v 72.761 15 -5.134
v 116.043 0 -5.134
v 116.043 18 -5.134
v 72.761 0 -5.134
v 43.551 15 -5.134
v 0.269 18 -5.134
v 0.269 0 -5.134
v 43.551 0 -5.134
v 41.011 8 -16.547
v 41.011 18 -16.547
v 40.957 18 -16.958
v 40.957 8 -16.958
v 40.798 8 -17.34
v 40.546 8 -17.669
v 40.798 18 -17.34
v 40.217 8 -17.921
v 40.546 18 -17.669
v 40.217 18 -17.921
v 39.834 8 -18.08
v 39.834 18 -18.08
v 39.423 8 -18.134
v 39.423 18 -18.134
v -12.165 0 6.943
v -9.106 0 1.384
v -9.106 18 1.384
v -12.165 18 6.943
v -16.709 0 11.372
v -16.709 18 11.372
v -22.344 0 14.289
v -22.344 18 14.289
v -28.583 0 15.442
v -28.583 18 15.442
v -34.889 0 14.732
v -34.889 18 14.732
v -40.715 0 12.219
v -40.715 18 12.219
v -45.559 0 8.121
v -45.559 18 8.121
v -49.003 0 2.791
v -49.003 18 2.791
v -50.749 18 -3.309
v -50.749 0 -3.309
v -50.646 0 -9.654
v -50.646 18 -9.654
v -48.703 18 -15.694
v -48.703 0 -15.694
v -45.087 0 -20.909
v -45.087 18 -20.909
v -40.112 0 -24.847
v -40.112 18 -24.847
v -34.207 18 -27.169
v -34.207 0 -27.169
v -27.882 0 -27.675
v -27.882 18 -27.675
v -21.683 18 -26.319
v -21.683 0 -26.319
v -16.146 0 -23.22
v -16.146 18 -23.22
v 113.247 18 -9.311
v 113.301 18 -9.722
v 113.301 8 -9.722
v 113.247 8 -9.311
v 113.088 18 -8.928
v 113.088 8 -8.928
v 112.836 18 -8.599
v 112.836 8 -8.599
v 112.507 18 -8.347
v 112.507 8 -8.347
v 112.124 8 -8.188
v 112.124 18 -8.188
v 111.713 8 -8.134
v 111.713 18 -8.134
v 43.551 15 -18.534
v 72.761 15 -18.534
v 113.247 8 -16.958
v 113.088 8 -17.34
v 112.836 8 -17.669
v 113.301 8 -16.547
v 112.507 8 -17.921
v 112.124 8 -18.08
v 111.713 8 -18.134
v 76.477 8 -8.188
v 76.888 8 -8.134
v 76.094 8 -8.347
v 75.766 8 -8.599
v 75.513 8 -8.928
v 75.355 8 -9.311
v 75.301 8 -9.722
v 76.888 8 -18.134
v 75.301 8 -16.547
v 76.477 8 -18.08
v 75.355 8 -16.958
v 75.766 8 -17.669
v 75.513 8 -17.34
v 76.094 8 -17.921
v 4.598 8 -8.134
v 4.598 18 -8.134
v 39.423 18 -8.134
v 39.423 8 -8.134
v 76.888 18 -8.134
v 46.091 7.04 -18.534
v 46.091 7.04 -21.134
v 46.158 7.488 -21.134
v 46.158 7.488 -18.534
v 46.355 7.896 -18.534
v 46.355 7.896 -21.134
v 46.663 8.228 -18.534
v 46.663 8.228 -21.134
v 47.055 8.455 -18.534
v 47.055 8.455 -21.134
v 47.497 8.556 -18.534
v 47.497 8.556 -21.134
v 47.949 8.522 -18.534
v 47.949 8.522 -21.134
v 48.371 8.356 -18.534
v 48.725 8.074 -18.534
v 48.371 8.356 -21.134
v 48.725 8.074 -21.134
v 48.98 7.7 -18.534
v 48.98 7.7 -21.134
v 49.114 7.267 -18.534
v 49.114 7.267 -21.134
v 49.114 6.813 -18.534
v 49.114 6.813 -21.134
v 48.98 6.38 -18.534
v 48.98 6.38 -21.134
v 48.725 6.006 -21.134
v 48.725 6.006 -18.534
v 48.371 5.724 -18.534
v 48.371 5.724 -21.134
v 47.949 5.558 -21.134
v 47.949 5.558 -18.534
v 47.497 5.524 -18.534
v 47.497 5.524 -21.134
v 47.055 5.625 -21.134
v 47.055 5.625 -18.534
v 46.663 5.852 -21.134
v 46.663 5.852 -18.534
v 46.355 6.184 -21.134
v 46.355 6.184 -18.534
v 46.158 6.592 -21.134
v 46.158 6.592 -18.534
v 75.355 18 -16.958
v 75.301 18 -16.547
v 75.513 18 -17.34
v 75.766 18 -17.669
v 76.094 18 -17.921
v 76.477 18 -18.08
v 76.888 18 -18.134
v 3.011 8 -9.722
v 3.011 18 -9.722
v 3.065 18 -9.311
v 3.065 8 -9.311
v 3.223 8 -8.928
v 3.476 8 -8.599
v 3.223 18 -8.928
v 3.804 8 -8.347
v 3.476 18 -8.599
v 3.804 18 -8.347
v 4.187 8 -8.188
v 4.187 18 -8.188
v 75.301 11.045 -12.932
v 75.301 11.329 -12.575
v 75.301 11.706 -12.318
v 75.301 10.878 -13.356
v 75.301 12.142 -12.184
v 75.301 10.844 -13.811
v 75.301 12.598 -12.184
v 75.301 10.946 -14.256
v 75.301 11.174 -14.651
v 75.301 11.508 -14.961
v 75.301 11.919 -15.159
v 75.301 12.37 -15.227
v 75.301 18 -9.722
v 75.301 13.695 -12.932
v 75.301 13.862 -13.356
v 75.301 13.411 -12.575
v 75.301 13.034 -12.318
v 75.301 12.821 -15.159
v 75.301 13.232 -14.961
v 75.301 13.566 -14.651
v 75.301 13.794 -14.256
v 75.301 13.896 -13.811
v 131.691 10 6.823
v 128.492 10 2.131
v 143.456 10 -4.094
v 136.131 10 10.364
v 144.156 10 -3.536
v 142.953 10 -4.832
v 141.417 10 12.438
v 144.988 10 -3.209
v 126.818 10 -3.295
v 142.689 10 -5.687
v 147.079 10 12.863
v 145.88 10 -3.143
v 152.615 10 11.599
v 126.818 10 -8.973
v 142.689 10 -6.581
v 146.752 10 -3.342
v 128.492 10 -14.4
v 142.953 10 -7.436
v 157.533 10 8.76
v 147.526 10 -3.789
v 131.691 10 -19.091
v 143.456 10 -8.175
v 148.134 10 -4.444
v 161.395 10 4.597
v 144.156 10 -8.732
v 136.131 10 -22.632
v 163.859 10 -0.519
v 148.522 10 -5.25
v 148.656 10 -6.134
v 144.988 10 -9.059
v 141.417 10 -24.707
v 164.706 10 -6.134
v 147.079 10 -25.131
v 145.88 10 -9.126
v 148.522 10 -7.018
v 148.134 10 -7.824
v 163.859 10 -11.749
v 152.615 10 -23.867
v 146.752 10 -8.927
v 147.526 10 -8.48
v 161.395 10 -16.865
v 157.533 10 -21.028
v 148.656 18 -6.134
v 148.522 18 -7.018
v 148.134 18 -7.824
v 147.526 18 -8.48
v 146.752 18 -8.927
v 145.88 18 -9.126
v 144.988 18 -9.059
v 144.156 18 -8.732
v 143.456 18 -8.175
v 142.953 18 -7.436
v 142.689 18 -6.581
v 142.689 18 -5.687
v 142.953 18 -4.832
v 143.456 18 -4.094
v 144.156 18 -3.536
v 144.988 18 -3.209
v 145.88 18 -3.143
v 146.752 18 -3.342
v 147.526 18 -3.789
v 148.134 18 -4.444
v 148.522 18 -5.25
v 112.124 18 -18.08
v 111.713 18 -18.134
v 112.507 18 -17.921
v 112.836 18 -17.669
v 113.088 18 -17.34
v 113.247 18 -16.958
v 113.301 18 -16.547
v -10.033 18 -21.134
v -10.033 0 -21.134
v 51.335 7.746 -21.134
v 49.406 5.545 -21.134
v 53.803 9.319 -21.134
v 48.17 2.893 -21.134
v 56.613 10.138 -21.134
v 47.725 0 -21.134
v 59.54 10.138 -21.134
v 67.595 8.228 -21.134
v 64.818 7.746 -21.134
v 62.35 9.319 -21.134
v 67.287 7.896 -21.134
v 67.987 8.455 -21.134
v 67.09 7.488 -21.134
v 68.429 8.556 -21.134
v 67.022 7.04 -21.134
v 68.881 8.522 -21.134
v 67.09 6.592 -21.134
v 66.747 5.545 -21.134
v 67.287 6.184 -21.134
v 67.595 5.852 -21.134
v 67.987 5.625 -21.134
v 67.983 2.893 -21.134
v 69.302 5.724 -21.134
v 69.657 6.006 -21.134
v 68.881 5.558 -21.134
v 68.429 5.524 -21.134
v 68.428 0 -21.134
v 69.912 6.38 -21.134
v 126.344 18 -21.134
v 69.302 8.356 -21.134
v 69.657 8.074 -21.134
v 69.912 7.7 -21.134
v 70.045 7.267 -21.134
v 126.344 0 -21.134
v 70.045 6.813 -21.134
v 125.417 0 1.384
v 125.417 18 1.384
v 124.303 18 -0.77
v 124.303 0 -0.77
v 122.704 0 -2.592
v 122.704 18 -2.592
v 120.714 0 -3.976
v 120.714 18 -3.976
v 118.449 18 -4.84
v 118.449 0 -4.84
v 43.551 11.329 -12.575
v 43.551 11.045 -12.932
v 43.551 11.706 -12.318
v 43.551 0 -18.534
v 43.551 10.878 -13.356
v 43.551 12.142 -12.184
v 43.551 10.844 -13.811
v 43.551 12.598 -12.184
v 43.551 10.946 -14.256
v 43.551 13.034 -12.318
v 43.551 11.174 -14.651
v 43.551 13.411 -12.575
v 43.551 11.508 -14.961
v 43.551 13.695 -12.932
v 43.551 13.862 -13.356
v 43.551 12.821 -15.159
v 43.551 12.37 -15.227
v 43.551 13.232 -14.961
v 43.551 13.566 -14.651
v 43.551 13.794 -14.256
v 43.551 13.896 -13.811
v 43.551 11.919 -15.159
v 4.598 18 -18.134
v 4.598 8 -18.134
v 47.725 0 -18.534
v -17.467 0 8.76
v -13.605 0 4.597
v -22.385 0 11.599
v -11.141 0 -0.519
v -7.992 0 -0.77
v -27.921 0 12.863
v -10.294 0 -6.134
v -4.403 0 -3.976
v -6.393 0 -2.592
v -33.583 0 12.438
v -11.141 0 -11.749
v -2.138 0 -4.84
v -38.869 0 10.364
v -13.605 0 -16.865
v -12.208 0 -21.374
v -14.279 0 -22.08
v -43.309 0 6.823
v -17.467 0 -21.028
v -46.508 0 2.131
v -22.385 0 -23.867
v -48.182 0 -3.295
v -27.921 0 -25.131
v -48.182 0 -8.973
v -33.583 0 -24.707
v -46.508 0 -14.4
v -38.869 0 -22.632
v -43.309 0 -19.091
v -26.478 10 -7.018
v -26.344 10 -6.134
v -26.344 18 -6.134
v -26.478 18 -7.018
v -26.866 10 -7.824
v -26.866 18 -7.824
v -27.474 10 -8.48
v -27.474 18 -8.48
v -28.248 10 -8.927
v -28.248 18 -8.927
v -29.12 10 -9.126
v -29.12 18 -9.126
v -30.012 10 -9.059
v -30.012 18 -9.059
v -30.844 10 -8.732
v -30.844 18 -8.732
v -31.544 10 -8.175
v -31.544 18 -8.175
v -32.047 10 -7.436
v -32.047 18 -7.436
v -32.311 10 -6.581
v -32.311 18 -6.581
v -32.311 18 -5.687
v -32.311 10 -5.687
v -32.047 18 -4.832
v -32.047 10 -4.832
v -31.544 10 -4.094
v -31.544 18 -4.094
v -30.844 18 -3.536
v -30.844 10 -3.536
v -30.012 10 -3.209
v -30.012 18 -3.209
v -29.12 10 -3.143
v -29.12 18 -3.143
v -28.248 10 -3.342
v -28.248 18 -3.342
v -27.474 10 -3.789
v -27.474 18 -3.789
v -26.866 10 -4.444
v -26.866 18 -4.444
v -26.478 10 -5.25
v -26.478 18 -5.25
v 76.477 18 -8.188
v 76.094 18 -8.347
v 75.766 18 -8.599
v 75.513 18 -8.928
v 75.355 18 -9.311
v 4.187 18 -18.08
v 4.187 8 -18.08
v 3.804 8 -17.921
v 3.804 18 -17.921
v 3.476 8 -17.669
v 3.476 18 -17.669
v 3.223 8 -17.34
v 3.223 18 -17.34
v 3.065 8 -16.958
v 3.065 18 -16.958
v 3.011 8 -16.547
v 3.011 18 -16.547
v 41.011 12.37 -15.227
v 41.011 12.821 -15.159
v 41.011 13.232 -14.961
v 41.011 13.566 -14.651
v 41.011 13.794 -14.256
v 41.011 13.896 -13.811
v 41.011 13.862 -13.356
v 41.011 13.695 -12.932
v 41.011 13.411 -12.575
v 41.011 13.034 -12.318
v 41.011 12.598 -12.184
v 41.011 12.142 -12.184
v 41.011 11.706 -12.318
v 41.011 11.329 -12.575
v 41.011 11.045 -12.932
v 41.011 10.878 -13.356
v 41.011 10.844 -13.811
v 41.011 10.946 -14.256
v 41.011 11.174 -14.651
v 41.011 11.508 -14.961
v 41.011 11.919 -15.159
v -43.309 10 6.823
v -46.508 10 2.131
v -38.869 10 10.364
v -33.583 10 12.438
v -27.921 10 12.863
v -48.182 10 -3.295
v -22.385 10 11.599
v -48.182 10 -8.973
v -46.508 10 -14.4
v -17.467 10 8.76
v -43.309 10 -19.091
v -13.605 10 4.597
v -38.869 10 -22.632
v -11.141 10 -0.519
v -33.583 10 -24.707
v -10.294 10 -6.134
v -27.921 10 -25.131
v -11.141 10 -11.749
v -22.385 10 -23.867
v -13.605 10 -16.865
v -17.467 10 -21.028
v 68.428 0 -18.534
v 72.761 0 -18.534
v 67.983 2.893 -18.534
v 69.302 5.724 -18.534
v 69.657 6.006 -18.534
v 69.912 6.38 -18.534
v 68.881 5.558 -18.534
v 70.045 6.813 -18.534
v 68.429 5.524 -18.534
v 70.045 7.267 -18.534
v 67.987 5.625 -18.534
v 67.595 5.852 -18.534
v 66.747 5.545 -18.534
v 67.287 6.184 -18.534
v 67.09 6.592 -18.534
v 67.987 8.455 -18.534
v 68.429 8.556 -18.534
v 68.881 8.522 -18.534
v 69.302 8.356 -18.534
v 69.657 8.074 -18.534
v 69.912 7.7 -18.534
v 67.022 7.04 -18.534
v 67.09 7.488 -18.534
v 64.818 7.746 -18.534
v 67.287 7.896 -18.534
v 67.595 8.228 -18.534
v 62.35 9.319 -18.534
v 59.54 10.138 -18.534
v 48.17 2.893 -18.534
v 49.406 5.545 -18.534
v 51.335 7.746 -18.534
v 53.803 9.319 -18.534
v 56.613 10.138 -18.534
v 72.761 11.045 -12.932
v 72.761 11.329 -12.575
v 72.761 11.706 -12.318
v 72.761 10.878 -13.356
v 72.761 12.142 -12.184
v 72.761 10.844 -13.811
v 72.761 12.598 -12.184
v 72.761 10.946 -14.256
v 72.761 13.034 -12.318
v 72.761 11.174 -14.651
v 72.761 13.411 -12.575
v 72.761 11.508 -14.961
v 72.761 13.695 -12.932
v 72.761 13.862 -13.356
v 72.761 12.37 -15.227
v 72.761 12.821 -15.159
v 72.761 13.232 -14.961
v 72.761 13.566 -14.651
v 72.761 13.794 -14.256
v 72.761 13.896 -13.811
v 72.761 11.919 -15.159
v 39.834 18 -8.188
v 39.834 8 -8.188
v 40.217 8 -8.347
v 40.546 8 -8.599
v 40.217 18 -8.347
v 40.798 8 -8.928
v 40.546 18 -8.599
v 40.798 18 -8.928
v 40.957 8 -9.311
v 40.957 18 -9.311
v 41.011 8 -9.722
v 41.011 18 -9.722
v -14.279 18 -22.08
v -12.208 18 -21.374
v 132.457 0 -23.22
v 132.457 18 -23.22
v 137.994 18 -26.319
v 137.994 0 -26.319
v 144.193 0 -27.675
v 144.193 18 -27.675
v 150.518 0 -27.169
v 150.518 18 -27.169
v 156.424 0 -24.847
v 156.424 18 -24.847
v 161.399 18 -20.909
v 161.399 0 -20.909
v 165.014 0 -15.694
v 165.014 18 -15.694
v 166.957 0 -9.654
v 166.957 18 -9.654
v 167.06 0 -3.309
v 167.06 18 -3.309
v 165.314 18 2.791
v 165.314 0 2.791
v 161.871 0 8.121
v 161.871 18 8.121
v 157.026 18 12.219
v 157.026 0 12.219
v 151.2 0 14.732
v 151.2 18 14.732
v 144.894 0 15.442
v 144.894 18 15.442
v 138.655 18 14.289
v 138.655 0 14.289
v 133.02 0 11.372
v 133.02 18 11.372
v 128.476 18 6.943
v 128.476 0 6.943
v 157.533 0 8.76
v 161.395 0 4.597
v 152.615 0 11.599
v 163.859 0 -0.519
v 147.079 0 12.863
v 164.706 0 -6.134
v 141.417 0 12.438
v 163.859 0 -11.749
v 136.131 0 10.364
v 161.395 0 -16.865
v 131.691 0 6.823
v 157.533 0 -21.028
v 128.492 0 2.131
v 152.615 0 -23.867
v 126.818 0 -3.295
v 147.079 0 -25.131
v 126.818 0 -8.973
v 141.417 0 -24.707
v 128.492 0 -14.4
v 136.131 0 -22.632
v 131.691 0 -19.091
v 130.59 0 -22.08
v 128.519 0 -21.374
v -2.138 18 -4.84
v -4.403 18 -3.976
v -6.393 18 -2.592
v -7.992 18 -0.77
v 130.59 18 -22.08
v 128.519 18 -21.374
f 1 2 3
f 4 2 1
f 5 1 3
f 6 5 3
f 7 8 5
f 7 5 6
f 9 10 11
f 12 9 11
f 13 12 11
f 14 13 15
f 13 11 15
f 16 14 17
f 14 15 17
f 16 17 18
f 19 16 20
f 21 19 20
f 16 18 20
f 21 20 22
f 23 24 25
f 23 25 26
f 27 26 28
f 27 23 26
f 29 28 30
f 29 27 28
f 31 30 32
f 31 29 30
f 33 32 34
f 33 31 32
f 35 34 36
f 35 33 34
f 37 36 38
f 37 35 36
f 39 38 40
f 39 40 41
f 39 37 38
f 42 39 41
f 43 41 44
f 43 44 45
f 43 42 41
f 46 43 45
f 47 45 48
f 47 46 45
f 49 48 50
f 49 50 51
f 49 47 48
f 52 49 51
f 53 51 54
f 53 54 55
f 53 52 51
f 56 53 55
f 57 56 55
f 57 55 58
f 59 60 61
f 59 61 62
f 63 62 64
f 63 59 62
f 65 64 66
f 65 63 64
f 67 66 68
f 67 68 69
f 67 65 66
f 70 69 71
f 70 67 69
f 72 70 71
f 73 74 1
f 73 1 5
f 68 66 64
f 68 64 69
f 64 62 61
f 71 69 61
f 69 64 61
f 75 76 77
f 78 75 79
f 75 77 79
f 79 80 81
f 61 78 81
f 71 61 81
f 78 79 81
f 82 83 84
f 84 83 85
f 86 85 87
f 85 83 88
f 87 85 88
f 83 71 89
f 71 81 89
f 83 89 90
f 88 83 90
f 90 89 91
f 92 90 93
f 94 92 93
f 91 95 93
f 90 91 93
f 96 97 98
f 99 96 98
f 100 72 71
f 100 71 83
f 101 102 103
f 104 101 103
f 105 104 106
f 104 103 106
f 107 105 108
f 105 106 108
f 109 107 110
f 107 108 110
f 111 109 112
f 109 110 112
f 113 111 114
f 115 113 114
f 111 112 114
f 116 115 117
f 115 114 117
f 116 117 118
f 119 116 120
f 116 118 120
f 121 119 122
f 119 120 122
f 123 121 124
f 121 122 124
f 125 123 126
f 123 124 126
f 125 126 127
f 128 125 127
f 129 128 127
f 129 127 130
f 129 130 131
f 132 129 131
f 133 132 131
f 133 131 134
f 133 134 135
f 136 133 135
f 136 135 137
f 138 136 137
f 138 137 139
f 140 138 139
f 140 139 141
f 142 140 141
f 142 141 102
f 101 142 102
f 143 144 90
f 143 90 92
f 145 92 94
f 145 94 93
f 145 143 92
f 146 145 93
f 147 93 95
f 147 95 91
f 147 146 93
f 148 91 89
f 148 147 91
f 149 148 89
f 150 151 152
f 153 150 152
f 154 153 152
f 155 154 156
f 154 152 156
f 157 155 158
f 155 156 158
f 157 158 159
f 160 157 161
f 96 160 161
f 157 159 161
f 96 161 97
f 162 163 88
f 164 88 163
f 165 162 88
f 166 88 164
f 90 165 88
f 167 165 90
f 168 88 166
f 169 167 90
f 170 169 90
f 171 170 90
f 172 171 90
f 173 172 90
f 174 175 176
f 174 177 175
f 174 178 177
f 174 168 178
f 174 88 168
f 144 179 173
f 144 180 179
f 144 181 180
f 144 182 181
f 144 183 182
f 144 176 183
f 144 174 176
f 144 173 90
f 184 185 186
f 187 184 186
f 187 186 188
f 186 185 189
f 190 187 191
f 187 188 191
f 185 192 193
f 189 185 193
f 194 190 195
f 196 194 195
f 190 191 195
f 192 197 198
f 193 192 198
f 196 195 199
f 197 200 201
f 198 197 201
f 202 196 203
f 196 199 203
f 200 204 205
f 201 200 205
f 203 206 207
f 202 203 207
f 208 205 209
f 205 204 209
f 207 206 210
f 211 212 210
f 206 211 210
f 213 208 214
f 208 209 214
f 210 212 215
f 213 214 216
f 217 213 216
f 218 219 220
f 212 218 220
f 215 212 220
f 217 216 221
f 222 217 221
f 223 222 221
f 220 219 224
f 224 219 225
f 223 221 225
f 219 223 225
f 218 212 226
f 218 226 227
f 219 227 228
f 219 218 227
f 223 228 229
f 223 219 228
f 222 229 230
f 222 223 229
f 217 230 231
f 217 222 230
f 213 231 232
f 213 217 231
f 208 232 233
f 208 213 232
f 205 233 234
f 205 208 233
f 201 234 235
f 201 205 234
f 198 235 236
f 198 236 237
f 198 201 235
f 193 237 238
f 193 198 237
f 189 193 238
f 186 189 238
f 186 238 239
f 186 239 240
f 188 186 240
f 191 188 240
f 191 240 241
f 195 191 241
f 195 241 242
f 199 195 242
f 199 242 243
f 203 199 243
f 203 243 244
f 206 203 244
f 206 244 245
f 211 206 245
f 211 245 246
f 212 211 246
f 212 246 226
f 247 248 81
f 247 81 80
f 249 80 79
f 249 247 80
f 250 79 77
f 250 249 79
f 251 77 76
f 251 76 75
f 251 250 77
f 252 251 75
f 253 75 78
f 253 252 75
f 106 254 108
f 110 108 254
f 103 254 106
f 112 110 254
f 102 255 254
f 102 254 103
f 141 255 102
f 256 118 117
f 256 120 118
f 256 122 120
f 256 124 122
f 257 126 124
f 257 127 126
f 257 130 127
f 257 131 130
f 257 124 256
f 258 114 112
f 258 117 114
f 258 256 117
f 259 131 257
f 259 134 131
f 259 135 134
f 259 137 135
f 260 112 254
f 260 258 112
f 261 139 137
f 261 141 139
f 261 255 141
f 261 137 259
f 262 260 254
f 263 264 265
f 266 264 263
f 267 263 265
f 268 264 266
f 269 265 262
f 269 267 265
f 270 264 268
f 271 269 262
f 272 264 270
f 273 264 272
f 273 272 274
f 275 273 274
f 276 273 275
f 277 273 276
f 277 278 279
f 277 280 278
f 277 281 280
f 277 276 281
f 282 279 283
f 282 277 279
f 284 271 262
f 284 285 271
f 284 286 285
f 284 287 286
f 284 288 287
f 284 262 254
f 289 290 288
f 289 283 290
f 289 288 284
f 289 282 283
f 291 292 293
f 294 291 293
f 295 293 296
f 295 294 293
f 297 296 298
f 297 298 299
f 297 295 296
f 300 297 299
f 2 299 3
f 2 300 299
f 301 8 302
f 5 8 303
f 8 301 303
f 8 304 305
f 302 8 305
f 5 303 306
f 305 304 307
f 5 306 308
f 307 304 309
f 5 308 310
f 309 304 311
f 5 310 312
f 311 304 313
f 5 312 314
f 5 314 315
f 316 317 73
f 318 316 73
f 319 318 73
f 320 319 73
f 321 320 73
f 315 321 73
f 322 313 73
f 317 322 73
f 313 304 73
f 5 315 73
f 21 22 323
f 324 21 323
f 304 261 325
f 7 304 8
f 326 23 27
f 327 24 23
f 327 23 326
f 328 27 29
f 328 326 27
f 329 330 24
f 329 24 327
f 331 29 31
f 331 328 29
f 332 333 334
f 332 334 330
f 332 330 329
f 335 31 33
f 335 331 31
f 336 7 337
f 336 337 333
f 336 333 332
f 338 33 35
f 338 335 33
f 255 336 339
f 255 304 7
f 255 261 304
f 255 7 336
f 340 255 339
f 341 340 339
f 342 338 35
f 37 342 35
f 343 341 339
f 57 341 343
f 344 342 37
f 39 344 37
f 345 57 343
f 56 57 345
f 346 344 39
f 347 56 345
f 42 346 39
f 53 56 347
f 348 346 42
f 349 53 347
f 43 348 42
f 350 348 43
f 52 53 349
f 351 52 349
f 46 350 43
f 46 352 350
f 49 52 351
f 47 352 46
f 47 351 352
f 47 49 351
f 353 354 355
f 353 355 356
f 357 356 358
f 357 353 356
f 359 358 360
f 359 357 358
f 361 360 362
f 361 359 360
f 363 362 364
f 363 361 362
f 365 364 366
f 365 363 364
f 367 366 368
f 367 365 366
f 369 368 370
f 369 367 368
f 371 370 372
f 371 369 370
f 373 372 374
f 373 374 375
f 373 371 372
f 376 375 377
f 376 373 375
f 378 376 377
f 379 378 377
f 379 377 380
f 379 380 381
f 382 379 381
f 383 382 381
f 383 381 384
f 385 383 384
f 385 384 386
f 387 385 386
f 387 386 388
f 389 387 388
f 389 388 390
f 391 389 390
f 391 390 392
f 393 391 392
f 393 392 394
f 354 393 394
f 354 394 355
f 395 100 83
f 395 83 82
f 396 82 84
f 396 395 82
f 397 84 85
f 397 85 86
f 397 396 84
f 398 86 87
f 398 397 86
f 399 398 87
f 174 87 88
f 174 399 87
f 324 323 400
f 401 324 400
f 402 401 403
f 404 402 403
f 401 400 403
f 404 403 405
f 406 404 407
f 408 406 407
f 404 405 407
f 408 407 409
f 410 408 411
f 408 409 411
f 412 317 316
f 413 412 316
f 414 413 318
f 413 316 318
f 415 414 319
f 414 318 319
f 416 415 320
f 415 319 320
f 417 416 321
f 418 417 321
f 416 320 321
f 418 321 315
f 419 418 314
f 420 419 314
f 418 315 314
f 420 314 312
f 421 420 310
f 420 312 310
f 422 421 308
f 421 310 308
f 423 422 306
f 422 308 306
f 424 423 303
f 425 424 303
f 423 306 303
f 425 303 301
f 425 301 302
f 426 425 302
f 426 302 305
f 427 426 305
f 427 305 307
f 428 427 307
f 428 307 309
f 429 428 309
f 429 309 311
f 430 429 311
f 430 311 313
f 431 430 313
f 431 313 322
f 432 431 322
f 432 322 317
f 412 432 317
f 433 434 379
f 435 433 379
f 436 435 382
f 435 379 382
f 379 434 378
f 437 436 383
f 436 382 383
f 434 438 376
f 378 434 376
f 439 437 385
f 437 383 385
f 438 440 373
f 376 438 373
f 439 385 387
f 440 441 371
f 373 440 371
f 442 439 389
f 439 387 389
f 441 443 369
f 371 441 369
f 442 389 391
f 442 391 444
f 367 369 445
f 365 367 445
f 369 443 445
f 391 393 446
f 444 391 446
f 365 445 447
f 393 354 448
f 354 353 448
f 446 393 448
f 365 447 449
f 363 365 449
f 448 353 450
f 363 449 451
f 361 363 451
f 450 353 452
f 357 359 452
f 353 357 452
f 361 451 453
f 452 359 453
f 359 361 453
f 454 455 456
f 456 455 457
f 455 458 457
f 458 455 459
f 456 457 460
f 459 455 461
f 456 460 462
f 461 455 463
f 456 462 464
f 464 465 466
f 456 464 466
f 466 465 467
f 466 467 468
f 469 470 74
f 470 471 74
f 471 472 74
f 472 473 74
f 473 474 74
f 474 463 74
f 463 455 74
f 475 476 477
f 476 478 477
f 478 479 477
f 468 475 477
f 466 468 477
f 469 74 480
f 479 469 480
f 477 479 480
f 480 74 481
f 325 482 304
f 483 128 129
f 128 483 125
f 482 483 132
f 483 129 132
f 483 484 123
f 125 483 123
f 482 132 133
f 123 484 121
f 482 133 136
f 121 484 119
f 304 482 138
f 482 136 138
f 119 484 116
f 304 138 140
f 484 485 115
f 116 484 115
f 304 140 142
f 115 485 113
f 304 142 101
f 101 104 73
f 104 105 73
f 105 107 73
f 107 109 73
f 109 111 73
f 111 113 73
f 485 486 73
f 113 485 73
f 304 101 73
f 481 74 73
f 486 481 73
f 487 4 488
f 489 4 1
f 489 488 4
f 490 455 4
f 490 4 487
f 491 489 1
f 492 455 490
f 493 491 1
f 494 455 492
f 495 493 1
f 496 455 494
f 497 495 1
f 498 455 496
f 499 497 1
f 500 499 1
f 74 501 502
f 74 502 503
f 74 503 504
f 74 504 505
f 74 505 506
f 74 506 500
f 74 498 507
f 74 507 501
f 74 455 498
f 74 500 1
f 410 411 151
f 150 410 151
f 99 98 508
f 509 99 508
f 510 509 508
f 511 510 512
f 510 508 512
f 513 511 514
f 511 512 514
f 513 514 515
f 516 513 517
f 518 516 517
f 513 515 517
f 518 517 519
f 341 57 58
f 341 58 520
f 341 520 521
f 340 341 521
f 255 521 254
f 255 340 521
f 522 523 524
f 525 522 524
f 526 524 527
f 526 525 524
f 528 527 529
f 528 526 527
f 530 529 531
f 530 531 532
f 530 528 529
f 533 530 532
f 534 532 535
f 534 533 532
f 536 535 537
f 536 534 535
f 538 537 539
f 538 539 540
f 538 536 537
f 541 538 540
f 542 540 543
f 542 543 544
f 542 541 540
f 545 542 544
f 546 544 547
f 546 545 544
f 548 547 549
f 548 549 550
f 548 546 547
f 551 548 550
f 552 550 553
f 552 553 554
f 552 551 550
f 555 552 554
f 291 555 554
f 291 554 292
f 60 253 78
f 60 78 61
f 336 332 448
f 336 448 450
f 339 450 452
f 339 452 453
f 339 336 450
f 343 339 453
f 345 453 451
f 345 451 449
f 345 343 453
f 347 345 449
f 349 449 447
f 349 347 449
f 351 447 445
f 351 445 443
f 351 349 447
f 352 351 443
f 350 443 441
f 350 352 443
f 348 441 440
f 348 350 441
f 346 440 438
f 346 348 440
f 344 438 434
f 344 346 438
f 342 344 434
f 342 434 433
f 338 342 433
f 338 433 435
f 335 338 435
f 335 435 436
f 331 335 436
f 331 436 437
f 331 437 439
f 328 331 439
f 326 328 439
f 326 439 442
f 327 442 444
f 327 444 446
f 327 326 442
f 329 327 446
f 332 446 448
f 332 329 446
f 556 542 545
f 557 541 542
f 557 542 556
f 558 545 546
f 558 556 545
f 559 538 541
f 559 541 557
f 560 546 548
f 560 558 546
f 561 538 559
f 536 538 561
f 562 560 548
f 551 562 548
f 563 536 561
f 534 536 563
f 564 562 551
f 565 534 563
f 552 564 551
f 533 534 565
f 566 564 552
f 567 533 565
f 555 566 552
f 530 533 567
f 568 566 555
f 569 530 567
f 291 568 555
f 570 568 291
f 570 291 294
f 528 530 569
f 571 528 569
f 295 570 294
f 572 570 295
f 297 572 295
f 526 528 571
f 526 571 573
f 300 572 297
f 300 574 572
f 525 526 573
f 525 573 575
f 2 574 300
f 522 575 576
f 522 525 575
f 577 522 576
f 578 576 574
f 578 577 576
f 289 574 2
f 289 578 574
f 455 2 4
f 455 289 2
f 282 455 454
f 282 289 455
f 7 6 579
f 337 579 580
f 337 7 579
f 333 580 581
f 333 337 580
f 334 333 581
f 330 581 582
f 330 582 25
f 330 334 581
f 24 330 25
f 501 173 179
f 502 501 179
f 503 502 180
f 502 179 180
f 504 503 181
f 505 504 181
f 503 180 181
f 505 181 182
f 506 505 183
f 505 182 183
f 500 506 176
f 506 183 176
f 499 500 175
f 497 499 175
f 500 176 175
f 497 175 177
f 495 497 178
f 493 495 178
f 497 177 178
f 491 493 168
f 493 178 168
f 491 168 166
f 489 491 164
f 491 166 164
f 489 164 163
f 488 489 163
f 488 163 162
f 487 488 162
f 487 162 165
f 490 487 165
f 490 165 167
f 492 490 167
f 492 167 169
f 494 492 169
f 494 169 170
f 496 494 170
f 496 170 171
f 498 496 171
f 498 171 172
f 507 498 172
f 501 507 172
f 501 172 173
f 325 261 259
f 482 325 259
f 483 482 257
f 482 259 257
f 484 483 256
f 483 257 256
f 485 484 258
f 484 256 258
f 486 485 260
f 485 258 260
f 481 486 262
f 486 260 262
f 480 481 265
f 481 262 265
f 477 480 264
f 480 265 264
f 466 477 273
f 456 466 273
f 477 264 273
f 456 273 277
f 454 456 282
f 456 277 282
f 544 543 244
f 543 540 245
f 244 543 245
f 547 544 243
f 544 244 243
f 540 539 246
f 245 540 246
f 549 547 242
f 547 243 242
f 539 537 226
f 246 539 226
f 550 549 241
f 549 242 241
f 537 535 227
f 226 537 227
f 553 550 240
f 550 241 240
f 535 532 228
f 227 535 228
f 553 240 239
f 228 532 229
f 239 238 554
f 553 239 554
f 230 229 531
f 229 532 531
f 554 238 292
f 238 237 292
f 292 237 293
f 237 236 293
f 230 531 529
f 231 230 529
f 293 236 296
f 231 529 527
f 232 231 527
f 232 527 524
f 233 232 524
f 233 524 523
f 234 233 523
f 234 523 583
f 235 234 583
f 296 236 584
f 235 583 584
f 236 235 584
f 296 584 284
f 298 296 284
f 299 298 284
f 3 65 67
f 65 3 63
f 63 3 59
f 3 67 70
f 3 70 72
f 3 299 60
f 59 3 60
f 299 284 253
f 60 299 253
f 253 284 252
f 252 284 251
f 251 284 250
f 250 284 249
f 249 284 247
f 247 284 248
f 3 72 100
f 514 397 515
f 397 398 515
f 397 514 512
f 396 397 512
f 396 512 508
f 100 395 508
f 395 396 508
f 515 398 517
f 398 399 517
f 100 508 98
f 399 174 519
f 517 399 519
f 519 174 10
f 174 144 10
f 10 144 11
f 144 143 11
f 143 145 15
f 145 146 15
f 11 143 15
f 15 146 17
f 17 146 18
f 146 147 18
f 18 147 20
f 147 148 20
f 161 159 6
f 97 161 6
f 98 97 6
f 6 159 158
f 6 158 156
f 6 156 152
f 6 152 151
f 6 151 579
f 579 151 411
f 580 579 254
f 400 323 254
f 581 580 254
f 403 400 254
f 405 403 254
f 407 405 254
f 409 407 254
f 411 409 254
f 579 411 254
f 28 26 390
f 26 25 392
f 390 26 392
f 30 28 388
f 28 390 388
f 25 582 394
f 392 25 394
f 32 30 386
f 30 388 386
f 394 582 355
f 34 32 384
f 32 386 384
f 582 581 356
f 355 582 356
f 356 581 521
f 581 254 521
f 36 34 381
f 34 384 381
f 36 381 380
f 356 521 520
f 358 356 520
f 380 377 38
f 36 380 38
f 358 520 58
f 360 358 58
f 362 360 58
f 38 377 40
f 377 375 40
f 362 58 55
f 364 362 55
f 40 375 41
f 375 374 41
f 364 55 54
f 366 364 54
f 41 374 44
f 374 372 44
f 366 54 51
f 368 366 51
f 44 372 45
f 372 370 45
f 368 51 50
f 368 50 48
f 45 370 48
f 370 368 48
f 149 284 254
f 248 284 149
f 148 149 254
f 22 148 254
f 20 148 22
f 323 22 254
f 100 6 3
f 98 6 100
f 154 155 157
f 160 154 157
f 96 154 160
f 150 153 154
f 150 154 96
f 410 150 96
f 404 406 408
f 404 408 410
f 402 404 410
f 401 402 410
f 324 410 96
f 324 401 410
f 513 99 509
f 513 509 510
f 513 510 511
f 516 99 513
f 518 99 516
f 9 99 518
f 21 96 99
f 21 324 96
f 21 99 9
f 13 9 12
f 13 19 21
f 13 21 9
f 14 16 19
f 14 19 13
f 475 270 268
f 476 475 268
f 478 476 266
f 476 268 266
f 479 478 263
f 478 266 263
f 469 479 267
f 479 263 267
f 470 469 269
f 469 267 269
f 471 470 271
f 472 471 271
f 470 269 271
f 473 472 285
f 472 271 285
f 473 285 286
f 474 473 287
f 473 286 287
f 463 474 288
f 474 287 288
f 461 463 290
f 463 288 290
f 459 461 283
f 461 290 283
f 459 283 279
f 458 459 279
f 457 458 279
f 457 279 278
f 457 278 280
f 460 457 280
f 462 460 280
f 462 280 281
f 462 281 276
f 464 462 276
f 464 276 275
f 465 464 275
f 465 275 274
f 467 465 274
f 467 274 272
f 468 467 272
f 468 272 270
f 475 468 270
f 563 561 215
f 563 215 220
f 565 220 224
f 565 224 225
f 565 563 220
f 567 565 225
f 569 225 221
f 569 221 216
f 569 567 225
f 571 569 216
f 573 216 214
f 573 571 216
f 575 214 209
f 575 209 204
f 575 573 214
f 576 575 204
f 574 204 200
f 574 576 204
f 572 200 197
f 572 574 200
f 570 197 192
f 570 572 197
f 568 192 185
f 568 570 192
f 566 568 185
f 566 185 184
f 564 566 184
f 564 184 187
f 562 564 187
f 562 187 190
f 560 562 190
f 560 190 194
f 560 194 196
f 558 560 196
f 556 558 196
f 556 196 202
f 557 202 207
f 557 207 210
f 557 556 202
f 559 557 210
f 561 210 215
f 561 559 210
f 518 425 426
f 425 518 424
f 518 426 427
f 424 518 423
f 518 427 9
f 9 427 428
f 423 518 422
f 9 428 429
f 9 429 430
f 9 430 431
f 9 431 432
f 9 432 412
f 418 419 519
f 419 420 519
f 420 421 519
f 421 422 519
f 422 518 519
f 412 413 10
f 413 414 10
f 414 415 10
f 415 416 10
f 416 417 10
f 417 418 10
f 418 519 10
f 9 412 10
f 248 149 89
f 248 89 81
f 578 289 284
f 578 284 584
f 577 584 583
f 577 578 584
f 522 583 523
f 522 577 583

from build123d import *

# Parameters (mm, degrees)
SKETCH1_R      = 3
EXTRUDE1_DEPTH = 18
SKETCH1_3_R    = 19.05
EXTRUDE2_DEPTH = 10
SKETCH2_R      = 1.52
EXTRUDE3_DEPTH = 37.59
EXTRUDE4_START = -2.6
SKETCH3_W      = 29.21
SKETCH3_H      = 15
EXTRUDE4_DEPTH = 34.99
EXTRUDE6_DEPTH = 10
SKETCH8_R      = 1.53
EXTRUDE7_DEPTH = 43
EXTRUDE8_DEPTH = 37.59


with BuildPart() as part:
    # Sketch1 → Extrude1 (new body)
    with BuildSketch(Plane(origin=(0, 0, 0), x_dir=(1, 0, 0), z_dir=(0, 1, 0))):
        with BuildLine():
            Line((-10.033035154, 21.134136258), (126.344272034, 21.134136258))
            ThreePointArc((126.344272034, 21.134136258), (129.573902971, 21.670020662), (132.457392138, 23.220239455))
            ThreePointArc((132.457392138, 23.220239455), (166.412495407, 0.194425945), (125.416806741, -1.383749149))
            ThreePointArc((125.416806741, -1.383749149), (121.751361628, 3.344530461), (116.04264662, 5.134136258))
            Line((116.04264662, 5.134136258), (0.26859026, 5.134136258))
            ThreePointArc((0.26859026, 5.134136258), (-5.440124747, 3.344530461), (-9.10556986, -1.383749149))
            ThreePointArc((-9.10556986, -1.383749149), (-50.101258526, 0.194425945), (-16.146155257, 23.220239455))
            ThreePointArc((-16.146155257, 23.220239455), (-13.262666091, 21.670020662), (-10.033035154, 21.134136258))
        make_face()
        with Locations((-29.34438156, 6.134136258)):
            Circle(SKETCH1_R, mode=Mode.SUBTRACT)
        with Locations((145.65561844, 6.134136258)):
            Circle(SKETCH1_R, mode=Mode.SUBTRACT)
    extrude(amount=EXTRUDE1_DEPTH)

    # Sketch1<3> → Extrude2 (cut)
    with BuildSketch(Plane(origin=(0, 0, 0), x_dir=(1, 0, 0), z_dir=(0, 1, 0))):
        with Locations((-29.34438156, 6.134136258)):
            Circle(SKETCH1_3_R)
        with Locations((145.65561844, 6.134136258)):
            Circle(SKETCH1_3_R)
    extrude(amount=EXTRUDE2_DEPTH, mode=Mode.SUBTRACT)

    # Sketch2 → Extrude3 (cut, through all)
    with BuildSketch(Plane(origin=(0, 0, -21.134136258), x_dir=(-1, 0, 0), z_dir=(0, 0, -1))):
        with Locations((-68.542401875, 7.04)):
            Circle(SKETCH2_R)
        with Locations((-47.61061844, 7.04)):
            Circle(SKETCH2_R)
    extrude(amount=-EXTRUDE3_DEPTH, mode=Mode.SUBTRACT)

    # Sketch3 → Extrude4 (cut, through all)
    with BuildSketch(Plane(origin=(0, 0, -21.134136258), x_dir=(-1, 0, 0), z_dir=(0, 0, -1)).offset(EXTRUDE4_START)):
        with Locations((-58.15561844, 7.5)):
            Rectangle(SKETCH3_W, SKETCH3_H)
    extrude(amount=-EXTRUDE4_DEPTH, mode=Mode.SUBTRACT)

    # Sketch6 → Extrude6 (cut)
    with BuildSketch(Plane(origin=(0, 18, 0), x_dir=(1, 0, 0), z_dir=(0, 1, 0))):
        with BuildLine():
            Line((41.01061844, 13.134136258), (41.01061844, 16.546636258))
            ThreePointArc((41.01061844, 16.546636258), (40.545650455, 17.669168273), (39.42311844, 18.134136258))
            Line((39.42311844, 18.134136258), (4.59811844, 18.134136258))
            ThreePointArc((4.59811844, 18.134136258), (3.475586425, 17.669168273), (3.01061844, 16.546636258))
            Line((3.01061844, 16.546636258), (3.01061844, 9.721636258))
            ThreePointArc((3.01061844, 9.721636258), (3.475586425, 8.599104243), (4.59811844, 8.134136258))
            Line((4.59811844, 8.134136258), (39.42311844, 8.134136258))
            ThreePointArc((39.42311844, 8.134136258), (40.545650455, 8.599104243), (41.01061844, 9.721636258))
            Line((41.01061844, 9.721636258), (41.01061844, 13.134136258))
        make_face()
        with BuildLine():
            Line((75.30061844, 9.721636258), (75.30061844, 13.134136258))
            Line((75.30061844, 13.134136258), (75.30061844, 16.546636258))
            ThreePointArc((75.30061844, 16.546636258), (75.765586425, 17.669168273), (76.88811844, 18.134136258))
            Line((76.88811844, 18.134136258), (111.71311844, 18.134136258))
            ThreePointArc((111.71311844, 18.134136258), (112.835650455, 17.669168273), (113.30061844, 16.546636258))
            Line((113.30061844, 16.546636258), (113.30061844, 9.721636258))
            ThreePointArc((113.30061844, 9.721636258), (112.835650455, 8.599104243), (111.71311844, 8.134136258))
            Line((111.71311844, 8.134136258), (76.88811844, 8.134136258))
            ThreePointArc((76.88811844, 8.134136258), (75.765586425, 8.599104243), (75.30061844, 9.721636258))
        make_face()
    extrude(amount=-EXTRUDE6_DEPTH, mode=Mode.SUBTRACT)

    # Sketch8 → Extrude7 (cut)
    with BuildSketch(Plane(origin=(75.30061844, 0, 0), x_dir=(0, 0, -1), z_dir=(1, 0, 0))):
        with Locations((13.696636258, 12.37)):
            Circle(SKETCH8_R)
    extrude(amount=-EXTRUDE7_DEPTH, mode=Mode.SUBTRACT)

    # Sketch9 → Extrude8 (cut, through all)
    with BuildSketch(Plane(origin=(0, 0, -21.134136258), x_dir=(-1, 0, 0), z_dir=(0, 0, -1))):
        with BuildLine():
            ThreePointArc((-68.427924828, 0), (-58.131552552, -10.4619369), (-47.724510158, -0.110083234))
            ThreePointArc((-47.724510158, -0.110083234), (-47.724656491, -0.055040839), (-47.725095487, 0))
            Line((-47.725095487, 0), (-68.427924828, 0))
        make_face()
        with BuildLine():
            Line((-68.427924828, 0), (-47.725095487, 0))
            ThreePointArc((-47.725095487, 0), (-58.076510158, 10.241916766), (-68.427924828, 0))
        make_face()
    extrude(amount=-EXTRUDE8_DEPTH, mode=Mode.SUBTRACT)


solid = part.part
